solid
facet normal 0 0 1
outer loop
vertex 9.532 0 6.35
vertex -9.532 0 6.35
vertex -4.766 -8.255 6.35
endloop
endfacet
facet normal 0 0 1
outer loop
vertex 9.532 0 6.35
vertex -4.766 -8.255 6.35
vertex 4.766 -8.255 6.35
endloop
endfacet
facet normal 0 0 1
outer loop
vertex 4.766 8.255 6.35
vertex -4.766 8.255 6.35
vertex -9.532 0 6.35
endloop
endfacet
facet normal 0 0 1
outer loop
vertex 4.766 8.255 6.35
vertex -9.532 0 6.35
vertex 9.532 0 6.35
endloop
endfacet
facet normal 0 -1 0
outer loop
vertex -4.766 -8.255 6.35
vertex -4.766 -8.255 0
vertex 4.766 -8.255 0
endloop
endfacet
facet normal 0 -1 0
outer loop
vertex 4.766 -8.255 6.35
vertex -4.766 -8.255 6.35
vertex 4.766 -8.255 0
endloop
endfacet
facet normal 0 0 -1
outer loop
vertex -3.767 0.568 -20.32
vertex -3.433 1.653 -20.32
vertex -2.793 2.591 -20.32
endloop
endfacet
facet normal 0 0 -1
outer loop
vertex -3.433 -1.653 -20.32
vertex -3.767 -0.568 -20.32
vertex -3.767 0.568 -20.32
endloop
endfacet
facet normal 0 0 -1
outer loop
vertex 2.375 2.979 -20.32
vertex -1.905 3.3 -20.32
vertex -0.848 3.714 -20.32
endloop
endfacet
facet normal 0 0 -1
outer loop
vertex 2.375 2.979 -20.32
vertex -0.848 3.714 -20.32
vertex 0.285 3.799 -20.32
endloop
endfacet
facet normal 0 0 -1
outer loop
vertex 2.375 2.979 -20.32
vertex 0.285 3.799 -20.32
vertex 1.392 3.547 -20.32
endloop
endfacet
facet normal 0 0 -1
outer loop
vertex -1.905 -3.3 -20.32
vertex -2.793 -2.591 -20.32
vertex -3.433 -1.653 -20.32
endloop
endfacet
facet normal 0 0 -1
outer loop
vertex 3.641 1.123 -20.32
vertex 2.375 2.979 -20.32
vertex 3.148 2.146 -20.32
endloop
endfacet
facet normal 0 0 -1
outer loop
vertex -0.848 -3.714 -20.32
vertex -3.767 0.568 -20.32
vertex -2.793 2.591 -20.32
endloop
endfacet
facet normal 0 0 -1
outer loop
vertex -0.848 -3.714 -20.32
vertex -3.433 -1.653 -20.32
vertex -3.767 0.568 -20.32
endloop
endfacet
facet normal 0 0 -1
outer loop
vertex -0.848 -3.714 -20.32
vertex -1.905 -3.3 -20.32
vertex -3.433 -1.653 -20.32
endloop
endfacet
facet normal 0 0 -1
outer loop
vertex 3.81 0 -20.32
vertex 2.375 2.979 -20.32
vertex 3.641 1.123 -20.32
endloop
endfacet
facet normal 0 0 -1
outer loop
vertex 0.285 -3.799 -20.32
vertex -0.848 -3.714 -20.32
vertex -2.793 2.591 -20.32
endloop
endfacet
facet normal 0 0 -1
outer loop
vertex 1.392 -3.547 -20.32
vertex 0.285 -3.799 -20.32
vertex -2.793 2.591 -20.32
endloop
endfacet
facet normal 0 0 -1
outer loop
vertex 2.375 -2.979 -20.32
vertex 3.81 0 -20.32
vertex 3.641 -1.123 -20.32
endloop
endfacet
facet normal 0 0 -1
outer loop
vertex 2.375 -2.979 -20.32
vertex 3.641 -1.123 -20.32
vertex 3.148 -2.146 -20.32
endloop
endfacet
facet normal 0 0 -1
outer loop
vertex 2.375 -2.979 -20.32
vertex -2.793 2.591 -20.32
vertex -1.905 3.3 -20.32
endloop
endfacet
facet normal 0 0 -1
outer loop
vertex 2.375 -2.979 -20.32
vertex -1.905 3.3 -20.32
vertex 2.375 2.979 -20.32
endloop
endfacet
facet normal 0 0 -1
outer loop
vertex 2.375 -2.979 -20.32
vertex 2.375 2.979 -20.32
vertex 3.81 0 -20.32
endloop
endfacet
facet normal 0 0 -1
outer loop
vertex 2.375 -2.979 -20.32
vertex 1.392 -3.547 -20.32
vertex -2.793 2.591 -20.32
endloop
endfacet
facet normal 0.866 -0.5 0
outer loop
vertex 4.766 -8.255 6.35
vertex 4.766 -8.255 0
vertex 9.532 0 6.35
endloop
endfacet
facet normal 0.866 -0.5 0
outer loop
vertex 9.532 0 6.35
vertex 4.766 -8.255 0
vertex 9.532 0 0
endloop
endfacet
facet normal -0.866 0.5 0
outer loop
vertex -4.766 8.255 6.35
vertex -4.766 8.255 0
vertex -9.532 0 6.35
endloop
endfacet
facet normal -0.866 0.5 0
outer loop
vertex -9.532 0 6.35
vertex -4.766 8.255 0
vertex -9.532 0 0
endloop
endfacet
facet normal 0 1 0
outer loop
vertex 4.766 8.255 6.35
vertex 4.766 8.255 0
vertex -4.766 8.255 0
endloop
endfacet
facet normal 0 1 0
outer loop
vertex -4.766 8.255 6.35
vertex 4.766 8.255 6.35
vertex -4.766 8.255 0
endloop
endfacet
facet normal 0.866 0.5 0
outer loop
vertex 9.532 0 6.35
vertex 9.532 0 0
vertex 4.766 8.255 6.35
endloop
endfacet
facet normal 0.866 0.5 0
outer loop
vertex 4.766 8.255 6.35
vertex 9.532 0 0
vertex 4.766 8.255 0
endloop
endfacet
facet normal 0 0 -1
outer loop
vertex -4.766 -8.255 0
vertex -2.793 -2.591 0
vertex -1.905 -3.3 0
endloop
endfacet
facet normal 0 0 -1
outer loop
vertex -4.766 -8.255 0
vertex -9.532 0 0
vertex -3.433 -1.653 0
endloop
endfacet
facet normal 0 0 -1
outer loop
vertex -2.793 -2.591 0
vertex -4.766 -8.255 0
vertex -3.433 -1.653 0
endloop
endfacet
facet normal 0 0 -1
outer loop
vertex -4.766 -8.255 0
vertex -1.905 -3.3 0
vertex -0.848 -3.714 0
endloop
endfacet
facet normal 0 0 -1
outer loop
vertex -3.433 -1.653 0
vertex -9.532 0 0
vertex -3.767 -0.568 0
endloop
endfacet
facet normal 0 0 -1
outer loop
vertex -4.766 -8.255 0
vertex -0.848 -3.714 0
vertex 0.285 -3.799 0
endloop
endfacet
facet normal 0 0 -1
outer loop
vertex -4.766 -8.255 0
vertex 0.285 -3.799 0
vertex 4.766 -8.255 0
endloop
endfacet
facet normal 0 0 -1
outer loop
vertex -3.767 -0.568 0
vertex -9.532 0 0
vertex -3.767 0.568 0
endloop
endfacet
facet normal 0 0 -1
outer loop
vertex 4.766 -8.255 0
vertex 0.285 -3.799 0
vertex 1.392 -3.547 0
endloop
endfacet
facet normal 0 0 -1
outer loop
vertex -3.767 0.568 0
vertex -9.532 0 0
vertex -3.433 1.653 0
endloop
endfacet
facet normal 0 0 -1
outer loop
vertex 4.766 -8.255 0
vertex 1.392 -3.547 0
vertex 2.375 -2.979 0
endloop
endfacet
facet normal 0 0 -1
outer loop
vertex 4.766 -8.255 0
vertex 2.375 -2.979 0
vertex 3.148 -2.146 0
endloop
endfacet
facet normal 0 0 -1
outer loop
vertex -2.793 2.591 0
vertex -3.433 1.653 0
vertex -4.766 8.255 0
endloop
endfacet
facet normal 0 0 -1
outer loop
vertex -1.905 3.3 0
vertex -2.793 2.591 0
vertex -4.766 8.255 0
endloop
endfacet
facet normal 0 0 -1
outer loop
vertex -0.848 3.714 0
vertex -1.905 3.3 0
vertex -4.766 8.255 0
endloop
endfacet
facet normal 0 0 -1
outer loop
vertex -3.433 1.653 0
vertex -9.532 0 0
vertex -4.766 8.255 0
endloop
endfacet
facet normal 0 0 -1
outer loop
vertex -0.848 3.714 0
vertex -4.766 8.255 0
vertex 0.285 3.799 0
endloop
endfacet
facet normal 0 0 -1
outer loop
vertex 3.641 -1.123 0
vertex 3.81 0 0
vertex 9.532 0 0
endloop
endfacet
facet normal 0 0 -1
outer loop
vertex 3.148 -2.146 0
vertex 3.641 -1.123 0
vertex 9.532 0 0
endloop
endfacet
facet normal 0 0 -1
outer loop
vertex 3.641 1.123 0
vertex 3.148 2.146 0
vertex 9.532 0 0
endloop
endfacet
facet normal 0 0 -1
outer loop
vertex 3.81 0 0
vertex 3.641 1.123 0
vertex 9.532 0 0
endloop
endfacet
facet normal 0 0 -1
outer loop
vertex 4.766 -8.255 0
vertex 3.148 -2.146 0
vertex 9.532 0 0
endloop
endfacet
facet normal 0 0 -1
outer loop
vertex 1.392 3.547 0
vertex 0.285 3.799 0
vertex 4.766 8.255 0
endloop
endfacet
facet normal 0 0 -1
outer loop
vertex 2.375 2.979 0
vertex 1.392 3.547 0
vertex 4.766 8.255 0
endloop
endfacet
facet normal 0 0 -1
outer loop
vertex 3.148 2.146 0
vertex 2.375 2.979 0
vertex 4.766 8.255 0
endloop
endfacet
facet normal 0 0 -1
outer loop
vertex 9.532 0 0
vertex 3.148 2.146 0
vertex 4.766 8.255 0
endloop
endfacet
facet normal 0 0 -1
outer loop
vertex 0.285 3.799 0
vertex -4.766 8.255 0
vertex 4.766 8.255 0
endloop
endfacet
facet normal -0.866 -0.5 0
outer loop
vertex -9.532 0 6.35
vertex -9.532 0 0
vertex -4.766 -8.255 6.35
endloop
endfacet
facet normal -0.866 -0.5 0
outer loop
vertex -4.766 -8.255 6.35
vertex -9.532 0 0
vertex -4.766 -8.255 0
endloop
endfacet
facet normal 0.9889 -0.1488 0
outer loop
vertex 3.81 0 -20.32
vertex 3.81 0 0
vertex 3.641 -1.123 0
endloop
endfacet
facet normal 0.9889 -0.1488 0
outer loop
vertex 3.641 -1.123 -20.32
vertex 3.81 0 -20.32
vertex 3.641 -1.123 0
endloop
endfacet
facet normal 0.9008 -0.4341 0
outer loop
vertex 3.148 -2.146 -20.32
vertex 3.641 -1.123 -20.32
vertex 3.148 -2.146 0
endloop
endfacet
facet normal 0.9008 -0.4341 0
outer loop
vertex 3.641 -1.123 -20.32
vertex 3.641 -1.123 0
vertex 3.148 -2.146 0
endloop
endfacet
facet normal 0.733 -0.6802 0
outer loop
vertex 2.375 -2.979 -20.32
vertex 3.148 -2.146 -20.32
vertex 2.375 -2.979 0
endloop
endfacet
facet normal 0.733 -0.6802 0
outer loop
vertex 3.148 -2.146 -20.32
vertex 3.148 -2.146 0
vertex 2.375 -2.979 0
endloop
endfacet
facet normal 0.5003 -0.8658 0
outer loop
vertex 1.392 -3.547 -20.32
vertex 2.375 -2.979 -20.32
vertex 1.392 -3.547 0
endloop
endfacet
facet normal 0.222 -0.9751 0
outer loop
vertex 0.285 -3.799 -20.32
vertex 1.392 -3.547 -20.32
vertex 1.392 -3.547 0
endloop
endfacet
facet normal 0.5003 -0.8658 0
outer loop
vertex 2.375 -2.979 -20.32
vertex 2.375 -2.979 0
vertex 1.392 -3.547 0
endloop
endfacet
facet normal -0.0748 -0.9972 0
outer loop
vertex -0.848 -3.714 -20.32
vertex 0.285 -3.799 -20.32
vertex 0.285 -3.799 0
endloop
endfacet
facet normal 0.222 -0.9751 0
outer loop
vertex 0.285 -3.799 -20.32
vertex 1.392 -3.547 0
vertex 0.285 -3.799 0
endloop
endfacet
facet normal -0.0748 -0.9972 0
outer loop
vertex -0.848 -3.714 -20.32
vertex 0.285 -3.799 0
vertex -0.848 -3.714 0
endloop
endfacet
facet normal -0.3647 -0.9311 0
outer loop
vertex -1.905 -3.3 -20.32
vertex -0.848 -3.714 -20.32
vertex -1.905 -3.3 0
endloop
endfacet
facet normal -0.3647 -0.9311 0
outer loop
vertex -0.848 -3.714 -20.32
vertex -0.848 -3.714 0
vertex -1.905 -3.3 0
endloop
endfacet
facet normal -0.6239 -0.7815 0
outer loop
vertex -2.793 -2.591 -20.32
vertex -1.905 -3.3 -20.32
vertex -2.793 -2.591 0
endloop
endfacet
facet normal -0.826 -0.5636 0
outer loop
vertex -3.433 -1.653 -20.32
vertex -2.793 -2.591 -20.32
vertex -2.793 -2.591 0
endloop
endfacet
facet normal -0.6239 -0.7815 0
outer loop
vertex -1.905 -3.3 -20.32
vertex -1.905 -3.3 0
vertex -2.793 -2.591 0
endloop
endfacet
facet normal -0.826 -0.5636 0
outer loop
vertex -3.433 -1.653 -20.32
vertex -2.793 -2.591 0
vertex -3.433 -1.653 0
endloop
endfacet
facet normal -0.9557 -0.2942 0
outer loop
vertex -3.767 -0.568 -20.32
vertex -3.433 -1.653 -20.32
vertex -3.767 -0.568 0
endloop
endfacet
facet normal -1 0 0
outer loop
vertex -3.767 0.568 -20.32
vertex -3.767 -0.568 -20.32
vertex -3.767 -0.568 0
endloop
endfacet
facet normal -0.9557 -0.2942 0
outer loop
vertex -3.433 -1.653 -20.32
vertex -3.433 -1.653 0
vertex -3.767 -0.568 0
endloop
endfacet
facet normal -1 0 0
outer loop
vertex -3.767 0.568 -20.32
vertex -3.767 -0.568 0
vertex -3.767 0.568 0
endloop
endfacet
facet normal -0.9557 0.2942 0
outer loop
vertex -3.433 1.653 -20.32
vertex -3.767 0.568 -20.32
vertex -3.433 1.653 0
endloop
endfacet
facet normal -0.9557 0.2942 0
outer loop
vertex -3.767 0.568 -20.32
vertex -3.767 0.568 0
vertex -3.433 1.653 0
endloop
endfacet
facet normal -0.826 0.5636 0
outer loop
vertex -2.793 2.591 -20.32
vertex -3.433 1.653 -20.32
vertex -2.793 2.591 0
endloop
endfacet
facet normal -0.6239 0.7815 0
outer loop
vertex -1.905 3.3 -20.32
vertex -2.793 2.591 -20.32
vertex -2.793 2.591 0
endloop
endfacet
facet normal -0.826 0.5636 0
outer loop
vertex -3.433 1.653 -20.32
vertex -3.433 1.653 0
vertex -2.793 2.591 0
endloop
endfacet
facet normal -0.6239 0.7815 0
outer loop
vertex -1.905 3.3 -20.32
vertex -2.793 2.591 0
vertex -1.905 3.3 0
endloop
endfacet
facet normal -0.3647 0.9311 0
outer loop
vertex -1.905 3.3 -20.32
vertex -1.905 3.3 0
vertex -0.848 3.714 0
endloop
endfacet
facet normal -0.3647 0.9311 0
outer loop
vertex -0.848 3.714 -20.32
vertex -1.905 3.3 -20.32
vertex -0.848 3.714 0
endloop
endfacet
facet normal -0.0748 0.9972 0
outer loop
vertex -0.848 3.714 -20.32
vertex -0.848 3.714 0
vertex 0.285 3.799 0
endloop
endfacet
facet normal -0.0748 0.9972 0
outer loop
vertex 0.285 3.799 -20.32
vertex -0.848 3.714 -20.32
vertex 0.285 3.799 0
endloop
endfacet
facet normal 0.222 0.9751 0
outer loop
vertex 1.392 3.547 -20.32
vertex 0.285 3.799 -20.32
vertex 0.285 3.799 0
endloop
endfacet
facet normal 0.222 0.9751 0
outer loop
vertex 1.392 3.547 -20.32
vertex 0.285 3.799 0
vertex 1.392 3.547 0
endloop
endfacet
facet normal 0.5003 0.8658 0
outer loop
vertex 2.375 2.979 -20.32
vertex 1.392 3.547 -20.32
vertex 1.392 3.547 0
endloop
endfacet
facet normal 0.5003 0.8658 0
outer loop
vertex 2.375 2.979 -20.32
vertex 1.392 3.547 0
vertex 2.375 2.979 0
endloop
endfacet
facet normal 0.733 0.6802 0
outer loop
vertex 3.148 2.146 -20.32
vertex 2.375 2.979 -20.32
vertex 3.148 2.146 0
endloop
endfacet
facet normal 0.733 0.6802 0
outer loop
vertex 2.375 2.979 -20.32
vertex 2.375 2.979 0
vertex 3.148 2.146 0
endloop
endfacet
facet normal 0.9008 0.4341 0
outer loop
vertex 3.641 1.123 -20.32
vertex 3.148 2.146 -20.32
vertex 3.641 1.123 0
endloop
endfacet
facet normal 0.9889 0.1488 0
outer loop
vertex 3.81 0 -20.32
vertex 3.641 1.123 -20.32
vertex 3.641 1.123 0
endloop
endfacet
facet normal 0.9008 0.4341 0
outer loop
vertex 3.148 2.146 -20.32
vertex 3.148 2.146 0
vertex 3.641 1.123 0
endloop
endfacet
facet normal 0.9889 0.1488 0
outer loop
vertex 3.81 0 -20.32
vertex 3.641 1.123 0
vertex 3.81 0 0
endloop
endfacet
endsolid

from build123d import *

# Parameters (mm, degrees)
BOSS_EXTRUDE1_DEPTH = 6.35
SKETCH2_R           = 3.81
BOSS_EXTRUDE2_DEPTH = 20.32


with BuildPart() as part:
    # Sketch1 → Boss-Extrude1 (new body)
    with BuildSketch(Plane.XY):
        Polygon((4.766026472, -8.255), (9.532052944, 0), (4.766026472, 8.255), (-4.766026472, 8.255), (-9.532052944, 0), (-4.766026472, -8.255), align=None)
    extrude(amount=BOSS_EXTRUDE1_DEPTH)

    # Sketch2 → Boss-Extrude2 (add)
    with BuildSketch(Plane(origin=(0, 0, 0), x_dir=(-1, 0, 0), z_dir=(0, 0, -1))):
        with Locations(Location((0, 0, 0), (0, 0, 180))):
            Circle(SKETCH2_R)
    extrude(amount=BOSS_EXTRUDE2_DEPTH)


solid = part.part
